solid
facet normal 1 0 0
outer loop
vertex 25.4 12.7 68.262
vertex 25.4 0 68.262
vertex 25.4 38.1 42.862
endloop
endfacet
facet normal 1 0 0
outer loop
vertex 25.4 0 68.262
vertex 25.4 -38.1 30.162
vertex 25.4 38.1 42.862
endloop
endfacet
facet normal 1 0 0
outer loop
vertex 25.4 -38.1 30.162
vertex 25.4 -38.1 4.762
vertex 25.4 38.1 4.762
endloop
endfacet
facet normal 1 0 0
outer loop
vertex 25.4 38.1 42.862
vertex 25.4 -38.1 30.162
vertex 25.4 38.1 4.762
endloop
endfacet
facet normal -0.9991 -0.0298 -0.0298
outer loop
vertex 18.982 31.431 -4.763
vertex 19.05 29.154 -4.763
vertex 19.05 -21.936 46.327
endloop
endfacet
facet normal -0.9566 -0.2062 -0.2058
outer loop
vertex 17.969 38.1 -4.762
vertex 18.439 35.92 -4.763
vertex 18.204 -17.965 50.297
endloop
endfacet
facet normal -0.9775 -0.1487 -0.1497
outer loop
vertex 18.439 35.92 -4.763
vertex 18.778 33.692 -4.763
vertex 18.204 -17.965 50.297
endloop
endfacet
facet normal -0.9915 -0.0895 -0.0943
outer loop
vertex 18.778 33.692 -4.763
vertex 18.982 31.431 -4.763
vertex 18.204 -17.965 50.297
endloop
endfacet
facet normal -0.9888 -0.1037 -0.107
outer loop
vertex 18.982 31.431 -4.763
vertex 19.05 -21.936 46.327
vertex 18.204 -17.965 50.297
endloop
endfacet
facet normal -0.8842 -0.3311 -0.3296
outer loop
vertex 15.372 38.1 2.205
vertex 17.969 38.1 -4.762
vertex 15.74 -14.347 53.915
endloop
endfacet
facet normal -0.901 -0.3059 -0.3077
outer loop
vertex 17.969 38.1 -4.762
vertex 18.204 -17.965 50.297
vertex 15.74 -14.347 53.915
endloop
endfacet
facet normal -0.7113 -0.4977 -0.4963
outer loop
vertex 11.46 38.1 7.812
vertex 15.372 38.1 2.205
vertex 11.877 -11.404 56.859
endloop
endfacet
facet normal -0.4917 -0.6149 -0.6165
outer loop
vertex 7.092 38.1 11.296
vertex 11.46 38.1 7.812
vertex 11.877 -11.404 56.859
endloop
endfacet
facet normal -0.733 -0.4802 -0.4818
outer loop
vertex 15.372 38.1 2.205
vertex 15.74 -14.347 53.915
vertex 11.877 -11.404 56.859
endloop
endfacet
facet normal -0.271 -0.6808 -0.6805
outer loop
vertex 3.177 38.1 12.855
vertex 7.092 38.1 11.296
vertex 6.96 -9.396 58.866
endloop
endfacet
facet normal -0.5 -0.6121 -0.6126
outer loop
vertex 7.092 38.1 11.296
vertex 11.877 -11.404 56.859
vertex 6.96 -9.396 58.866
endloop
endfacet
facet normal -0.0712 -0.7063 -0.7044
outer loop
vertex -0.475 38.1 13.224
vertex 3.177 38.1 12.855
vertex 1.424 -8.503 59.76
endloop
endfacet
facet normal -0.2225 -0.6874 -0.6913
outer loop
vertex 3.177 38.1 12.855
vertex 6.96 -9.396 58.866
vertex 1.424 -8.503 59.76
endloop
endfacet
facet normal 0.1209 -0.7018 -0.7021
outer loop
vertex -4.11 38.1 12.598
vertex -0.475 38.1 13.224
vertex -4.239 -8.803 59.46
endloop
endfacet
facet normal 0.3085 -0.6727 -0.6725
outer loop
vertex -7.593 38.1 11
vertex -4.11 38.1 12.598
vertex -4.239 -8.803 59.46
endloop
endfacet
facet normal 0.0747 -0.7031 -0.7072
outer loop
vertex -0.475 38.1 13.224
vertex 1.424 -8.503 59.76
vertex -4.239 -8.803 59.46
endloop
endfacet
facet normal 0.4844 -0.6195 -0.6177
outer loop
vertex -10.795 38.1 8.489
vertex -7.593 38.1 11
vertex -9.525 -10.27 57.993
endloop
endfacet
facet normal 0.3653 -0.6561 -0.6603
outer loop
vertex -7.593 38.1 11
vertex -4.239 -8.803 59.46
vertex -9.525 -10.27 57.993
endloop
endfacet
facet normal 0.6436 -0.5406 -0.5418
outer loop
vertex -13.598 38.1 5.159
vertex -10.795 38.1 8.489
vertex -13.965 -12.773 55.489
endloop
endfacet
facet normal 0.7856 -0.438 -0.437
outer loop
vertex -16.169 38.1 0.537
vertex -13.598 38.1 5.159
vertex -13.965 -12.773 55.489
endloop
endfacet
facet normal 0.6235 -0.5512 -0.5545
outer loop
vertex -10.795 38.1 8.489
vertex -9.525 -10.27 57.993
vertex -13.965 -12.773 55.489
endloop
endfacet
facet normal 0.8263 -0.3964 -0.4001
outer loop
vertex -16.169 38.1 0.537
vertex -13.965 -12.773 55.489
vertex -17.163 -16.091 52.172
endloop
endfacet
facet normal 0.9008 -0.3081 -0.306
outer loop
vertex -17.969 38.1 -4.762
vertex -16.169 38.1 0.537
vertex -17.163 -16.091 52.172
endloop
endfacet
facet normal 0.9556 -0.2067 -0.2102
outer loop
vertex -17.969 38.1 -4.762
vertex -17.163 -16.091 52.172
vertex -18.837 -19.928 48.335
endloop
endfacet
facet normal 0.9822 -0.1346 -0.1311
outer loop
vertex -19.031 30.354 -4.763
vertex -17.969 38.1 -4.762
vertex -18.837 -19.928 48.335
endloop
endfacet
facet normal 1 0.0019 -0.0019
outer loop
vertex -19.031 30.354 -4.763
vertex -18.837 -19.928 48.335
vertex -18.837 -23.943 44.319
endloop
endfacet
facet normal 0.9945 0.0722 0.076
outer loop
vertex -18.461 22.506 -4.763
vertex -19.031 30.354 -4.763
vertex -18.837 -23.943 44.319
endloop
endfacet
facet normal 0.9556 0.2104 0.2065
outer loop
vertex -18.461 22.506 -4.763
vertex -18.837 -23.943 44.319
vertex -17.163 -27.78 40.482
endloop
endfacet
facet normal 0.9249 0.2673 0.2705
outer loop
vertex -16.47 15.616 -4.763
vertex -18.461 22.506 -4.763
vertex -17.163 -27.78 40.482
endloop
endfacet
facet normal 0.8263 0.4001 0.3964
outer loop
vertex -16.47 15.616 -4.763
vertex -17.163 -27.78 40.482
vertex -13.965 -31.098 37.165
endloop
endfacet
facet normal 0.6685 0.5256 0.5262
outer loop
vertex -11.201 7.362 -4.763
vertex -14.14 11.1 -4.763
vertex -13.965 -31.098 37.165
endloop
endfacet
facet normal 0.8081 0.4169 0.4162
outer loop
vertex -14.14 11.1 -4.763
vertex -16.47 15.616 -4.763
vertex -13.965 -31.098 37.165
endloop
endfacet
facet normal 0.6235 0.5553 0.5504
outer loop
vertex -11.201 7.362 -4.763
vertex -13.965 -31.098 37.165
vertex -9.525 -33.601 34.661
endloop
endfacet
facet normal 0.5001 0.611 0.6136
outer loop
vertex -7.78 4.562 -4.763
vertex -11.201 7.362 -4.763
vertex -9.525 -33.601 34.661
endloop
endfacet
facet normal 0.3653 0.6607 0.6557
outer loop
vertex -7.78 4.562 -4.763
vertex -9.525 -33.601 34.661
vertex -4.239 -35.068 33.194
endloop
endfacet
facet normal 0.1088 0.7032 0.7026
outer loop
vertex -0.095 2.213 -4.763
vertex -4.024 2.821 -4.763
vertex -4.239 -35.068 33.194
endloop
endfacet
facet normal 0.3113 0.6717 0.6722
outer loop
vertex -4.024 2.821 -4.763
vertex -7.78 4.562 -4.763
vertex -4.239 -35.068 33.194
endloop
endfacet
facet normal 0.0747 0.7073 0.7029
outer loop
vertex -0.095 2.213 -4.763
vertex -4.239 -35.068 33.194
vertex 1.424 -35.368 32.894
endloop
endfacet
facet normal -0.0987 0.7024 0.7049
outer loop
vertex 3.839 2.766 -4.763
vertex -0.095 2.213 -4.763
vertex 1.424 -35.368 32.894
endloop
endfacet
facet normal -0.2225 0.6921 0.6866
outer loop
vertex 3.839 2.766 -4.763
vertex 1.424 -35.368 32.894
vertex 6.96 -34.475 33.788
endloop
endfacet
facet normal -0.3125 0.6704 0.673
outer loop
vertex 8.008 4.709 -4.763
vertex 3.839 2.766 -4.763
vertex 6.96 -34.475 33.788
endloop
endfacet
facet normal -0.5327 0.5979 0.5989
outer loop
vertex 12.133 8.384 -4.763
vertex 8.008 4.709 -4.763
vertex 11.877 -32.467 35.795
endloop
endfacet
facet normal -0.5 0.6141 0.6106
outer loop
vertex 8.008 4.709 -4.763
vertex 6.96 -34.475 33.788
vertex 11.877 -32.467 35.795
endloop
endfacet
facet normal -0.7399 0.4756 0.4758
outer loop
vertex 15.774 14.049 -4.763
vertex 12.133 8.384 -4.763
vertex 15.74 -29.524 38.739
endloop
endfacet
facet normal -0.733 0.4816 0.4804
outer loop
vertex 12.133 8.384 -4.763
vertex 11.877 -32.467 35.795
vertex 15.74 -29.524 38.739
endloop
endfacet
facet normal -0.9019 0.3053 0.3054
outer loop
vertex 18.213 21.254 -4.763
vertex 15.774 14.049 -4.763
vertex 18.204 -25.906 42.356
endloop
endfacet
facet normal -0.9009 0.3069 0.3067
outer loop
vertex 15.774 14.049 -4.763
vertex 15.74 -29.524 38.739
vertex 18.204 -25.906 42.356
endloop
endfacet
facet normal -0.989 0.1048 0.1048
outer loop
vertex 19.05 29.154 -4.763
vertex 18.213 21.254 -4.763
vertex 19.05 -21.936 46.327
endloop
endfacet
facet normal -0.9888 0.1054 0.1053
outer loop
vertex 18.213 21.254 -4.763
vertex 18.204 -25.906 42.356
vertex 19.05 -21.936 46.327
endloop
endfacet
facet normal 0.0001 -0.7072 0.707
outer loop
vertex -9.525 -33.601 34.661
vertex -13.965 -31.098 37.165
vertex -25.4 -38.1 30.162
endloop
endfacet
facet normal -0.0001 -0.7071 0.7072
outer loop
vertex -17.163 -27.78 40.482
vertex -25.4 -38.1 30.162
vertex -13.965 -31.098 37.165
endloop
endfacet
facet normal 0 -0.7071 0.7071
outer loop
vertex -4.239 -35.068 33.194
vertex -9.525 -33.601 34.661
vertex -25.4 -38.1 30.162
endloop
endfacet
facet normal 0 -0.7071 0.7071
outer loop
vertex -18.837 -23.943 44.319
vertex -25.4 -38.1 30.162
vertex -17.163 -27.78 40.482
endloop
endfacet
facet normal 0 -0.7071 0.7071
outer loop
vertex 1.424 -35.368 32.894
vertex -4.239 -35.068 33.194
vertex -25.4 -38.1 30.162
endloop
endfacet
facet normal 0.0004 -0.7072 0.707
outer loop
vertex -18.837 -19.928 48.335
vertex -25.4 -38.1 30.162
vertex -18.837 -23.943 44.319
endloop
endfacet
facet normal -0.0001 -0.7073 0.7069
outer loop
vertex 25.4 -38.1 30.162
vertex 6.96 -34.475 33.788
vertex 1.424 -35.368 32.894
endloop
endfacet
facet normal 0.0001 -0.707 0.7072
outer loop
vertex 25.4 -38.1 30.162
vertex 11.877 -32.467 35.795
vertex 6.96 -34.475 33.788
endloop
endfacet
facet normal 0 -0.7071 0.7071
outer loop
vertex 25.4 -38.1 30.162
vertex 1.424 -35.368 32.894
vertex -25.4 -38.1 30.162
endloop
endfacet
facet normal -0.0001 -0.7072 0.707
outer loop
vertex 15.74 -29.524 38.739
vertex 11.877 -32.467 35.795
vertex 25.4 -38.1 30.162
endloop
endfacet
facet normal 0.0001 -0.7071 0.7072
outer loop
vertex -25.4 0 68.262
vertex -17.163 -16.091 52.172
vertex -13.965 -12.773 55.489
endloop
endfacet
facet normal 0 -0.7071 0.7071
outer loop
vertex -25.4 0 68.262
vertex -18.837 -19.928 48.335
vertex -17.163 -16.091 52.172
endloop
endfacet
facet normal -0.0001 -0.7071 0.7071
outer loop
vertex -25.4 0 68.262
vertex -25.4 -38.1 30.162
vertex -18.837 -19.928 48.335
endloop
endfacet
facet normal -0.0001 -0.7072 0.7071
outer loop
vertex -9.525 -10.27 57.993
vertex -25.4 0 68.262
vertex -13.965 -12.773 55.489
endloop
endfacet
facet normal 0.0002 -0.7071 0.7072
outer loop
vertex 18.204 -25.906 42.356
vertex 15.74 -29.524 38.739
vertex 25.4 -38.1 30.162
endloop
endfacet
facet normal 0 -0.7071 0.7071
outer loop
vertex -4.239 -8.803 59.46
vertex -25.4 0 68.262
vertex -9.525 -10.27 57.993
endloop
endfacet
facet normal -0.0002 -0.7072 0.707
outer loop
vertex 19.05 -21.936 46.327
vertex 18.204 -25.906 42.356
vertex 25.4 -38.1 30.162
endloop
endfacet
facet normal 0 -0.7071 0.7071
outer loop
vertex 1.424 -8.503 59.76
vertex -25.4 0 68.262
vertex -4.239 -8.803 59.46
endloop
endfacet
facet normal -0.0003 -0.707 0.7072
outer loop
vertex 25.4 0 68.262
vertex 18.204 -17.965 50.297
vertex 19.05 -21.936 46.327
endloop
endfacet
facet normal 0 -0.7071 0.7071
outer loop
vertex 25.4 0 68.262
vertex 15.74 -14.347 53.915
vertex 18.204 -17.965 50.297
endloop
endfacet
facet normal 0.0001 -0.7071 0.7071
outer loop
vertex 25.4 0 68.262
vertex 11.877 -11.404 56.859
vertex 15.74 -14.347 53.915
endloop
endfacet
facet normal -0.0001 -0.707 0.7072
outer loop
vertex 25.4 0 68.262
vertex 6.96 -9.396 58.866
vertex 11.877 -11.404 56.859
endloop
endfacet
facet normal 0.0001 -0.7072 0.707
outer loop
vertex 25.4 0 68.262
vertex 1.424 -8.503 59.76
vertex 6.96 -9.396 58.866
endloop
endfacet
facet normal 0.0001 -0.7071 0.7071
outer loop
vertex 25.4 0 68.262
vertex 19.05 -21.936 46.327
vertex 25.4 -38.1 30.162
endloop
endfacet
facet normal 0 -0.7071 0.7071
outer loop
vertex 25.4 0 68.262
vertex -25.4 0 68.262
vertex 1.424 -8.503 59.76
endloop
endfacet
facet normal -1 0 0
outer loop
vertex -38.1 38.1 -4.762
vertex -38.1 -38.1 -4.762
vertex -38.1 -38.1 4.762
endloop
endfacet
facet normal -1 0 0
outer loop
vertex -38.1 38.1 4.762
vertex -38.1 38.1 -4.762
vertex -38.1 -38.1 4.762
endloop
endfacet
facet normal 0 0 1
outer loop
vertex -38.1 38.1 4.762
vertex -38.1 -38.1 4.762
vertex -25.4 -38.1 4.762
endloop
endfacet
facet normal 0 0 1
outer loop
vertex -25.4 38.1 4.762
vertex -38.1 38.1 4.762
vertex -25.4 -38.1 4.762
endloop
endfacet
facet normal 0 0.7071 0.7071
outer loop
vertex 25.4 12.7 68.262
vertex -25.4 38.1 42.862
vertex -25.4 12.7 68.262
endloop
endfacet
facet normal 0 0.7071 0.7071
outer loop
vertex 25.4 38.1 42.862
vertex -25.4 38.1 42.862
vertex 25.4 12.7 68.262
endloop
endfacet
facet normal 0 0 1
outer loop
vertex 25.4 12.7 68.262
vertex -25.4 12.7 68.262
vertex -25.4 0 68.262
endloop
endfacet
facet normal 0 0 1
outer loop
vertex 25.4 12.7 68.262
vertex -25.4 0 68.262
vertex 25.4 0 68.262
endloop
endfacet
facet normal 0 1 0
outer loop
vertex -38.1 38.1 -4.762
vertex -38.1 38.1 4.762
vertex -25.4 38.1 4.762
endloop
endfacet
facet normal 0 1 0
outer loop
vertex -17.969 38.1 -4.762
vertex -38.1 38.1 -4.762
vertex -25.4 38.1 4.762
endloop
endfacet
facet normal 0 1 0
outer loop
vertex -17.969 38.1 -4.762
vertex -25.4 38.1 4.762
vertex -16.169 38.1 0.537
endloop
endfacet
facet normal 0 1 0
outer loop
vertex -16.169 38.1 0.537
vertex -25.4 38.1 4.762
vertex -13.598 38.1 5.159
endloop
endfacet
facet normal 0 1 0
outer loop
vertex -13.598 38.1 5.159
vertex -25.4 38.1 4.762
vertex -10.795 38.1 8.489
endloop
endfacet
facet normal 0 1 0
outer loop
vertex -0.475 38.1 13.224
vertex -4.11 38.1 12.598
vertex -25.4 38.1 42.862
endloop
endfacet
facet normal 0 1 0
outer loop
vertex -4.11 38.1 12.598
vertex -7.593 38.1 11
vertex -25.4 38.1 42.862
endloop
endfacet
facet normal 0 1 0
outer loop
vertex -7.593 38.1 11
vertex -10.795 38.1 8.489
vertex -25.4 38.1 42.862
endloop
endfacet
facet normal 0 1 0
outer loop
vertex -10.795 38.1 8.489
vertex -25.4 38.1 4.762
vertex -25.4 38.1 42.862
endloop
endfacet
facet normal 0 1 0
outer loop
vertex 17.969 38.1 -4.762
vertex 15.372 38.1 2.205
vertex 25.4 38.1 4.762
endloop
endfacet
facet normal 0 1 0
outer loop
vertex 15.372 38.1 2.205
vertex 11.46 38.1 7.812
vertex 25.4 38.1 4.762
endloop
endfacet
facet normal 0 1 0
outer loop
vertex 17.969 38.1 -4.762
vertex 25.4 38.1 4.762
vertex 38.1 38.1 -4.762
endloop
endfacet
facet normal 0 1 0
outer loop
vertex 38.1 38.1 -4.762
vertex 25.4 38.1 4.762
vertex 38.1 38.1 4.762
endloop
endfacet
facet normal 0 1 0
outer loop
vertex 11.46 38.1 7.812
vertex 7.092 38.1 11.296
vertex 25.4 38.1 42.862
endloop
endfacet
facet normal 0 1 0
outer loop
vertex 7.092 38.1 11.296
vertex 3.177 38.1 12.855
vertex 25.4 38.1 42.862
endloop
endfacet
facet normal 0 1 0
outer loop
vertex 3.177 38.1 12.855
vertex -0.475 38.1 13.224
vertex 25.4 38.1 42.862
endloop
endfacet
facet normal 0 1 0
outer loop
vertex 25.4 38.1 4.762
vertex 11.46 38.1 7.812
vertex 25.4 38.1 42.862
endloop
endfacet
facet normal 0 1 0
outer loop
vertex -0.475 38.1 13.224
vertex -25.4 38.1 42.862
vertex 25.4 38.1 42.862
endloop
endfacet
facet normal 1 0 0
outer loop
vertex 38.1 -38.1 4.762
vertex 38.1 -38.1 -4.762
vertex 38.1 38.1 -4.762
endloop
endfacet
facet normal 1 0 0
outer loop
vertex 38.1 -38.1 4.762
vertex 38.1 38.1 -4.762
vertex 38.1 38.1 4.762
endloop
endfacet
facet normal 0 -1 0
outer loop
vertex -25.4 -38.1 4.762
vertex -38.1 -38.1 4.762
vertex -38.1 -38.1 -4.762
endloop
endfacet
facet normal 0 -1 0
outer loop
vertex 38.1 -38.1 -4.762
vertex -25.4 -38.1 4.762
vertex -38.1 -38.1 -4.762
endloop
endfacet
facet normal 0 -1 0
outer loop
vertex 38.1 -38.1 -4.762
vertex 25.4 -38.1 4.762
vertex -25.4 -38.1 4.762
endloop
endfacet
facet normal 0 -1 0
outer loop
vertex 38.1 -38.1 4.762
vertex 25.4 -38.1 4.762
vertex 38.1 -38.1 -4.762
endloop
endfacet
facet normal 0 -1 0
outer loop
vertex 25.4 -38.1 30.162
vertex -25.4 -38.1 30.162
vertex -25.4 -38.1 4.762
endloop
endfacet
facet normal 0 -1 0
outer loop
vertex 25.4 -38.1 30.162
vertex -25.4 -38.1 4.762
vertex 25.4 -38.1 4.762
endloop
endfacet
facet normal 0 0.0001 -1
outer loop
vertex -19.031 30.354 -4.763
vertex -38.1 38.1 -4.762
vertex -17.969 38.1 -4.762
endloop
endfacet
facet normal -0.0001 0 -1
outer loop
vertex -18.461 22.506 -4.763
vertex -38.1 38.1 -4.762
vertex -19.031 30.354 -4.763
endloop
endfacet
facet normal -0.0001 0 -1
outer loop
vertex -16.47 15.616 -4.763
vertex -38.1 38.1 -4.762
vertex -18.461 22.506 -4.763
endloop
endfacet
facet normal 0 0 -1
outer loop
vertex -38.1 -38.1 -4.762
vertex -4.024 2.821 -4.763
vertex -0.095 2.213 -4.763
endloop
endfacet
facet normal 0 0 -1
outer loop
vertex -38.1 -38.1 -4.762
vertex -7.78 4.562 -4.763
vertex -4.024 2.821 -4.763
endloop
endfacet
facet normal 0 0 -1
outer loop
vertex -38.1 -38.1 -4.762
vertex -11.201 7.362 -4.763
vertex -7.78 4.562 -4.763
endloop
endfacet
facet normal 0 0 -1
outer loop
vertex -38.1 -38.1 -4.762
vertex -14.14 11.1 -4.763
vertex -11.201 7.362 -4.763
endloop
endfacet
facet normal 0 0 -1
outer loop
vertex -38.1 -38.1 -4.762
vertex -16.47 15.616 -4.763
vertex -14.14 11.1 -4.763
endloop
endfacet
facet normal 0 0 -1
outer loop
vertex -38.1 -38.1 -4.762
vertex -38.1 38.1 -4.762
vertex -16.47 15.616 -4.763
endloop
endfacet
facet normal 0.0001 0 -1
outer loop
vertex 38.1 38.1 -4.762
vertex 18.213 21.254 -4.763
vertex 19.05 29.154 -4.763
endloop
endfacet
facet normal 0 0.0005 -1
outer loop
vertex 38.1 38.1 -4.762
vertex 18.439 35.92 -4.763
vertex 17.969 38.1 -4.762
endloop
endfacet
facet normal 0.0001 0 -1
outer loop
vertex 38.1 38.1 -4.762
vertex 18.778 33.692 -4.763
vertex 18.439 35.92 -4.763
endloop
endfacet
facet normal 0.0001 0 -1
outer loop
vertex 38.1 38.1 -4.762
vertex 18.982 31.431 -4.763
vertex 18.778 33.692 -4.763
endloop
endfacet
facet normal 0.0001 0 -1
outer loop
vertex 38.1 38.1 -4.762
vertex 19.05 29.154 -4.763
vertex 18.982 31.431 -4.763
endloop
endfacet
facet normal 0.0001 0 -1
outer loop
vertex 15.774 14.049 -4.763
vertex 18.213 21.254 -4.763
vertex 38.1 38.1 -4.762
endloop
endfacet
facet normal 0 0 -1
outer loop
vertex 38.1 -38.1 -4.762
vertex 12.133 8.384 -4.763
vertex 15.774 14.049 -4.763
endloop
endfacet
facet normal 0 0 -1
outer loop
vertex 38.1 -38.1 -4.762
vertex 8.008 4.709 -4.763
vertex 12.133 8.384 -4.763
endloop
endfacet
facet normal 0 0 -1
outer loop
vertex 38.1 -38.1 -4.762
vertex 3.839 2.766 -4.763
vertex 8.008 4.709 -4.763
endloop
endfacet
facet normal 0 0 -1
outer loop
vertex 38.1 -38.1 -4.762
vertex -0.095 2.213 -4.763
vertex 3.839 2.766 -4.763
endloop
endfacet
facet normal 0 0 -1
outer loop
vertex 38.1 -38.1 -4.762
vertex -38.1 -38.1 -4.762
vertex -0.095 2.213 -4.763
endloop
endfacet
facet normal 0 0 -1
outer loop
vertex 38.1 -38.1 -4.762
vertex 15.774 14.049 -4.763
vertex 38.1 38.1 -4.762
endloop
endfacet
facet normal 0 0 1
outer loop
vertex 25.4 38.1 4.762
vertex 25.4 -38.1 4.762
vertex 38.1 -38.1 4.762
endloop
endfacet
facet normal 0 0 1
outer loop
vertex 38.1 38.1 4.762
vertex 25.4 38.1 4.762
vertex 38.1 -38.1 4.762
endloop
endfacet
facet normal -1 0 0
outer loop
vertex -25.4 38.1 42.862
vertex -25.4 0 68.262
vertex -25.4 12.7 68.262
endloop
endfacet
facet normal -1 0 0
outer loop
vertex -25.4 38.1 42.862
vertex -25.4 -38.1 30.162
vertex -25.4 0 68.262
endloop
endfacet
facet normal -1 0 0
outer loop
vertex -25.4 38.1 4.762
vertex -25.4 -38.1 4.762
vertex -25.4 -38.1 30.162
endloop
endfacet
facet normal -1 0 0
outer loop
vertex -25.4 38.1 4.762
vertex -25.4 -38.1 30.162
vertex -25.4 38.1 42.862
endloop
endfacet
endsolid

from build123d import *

# Parameters (mm, degrees)
F0_W     = 76.2
F0_H     = 9.525
F1_DEPTH = 38.1
F2_W     = 50.8
F2_H     = 76.2
F3_DEPTH = 63.5
F4_SIZE2 = 38.1
F4_SIZE  = 38.1
F5_R     = 19.05
F6_DEPTH = 190.246
F7_SIZE  = 25.4


with BuildPart() as f1:
    # F0 (on Front) → F1 (new body, symmetric)
    with BuildSketch(Plane.XZ):
        Rectangle(F0_W, F0_H)
    extrude(amount=F1_DEPTH, both=True)

    # F2 (on face) → F3 (join)
    with BuildSketch(Plane.XY.offset(4.7625)):
        Rectangle(F2_W, F2_H)
    extrude(amount=F3_DEPTH)

    # F4
    f4_edges = [f1.edges().sort_by_distance(p)[0] for p in [
        (0, -38.1, 68.2625),
    ]]
    chamfer(f4_edges, length=F4_SIZE, length2=F4_SIZE2)

    # F5 (on face) → F6 (cut)
    with BuildSketch(Plane(origin=(0, -34.13125, 34.13125), x_dir=(1, 0, 0), z_dir=(0, -0.707107, 0.707107))):
        with Locations((0, 17.24734)):
            Circle(F5_R)
    extrude(amount=-F6_DEPTH, mode=Mode.SUBTRACT)

    # F7
    f7_edges = [f1.edges().sort_by_distance(p)[0] for p in [
        (0, 38.1, 68.2625),
    ]]
    chamfer(f7_edges, length=F7_SIZE)


solid = f1.part
